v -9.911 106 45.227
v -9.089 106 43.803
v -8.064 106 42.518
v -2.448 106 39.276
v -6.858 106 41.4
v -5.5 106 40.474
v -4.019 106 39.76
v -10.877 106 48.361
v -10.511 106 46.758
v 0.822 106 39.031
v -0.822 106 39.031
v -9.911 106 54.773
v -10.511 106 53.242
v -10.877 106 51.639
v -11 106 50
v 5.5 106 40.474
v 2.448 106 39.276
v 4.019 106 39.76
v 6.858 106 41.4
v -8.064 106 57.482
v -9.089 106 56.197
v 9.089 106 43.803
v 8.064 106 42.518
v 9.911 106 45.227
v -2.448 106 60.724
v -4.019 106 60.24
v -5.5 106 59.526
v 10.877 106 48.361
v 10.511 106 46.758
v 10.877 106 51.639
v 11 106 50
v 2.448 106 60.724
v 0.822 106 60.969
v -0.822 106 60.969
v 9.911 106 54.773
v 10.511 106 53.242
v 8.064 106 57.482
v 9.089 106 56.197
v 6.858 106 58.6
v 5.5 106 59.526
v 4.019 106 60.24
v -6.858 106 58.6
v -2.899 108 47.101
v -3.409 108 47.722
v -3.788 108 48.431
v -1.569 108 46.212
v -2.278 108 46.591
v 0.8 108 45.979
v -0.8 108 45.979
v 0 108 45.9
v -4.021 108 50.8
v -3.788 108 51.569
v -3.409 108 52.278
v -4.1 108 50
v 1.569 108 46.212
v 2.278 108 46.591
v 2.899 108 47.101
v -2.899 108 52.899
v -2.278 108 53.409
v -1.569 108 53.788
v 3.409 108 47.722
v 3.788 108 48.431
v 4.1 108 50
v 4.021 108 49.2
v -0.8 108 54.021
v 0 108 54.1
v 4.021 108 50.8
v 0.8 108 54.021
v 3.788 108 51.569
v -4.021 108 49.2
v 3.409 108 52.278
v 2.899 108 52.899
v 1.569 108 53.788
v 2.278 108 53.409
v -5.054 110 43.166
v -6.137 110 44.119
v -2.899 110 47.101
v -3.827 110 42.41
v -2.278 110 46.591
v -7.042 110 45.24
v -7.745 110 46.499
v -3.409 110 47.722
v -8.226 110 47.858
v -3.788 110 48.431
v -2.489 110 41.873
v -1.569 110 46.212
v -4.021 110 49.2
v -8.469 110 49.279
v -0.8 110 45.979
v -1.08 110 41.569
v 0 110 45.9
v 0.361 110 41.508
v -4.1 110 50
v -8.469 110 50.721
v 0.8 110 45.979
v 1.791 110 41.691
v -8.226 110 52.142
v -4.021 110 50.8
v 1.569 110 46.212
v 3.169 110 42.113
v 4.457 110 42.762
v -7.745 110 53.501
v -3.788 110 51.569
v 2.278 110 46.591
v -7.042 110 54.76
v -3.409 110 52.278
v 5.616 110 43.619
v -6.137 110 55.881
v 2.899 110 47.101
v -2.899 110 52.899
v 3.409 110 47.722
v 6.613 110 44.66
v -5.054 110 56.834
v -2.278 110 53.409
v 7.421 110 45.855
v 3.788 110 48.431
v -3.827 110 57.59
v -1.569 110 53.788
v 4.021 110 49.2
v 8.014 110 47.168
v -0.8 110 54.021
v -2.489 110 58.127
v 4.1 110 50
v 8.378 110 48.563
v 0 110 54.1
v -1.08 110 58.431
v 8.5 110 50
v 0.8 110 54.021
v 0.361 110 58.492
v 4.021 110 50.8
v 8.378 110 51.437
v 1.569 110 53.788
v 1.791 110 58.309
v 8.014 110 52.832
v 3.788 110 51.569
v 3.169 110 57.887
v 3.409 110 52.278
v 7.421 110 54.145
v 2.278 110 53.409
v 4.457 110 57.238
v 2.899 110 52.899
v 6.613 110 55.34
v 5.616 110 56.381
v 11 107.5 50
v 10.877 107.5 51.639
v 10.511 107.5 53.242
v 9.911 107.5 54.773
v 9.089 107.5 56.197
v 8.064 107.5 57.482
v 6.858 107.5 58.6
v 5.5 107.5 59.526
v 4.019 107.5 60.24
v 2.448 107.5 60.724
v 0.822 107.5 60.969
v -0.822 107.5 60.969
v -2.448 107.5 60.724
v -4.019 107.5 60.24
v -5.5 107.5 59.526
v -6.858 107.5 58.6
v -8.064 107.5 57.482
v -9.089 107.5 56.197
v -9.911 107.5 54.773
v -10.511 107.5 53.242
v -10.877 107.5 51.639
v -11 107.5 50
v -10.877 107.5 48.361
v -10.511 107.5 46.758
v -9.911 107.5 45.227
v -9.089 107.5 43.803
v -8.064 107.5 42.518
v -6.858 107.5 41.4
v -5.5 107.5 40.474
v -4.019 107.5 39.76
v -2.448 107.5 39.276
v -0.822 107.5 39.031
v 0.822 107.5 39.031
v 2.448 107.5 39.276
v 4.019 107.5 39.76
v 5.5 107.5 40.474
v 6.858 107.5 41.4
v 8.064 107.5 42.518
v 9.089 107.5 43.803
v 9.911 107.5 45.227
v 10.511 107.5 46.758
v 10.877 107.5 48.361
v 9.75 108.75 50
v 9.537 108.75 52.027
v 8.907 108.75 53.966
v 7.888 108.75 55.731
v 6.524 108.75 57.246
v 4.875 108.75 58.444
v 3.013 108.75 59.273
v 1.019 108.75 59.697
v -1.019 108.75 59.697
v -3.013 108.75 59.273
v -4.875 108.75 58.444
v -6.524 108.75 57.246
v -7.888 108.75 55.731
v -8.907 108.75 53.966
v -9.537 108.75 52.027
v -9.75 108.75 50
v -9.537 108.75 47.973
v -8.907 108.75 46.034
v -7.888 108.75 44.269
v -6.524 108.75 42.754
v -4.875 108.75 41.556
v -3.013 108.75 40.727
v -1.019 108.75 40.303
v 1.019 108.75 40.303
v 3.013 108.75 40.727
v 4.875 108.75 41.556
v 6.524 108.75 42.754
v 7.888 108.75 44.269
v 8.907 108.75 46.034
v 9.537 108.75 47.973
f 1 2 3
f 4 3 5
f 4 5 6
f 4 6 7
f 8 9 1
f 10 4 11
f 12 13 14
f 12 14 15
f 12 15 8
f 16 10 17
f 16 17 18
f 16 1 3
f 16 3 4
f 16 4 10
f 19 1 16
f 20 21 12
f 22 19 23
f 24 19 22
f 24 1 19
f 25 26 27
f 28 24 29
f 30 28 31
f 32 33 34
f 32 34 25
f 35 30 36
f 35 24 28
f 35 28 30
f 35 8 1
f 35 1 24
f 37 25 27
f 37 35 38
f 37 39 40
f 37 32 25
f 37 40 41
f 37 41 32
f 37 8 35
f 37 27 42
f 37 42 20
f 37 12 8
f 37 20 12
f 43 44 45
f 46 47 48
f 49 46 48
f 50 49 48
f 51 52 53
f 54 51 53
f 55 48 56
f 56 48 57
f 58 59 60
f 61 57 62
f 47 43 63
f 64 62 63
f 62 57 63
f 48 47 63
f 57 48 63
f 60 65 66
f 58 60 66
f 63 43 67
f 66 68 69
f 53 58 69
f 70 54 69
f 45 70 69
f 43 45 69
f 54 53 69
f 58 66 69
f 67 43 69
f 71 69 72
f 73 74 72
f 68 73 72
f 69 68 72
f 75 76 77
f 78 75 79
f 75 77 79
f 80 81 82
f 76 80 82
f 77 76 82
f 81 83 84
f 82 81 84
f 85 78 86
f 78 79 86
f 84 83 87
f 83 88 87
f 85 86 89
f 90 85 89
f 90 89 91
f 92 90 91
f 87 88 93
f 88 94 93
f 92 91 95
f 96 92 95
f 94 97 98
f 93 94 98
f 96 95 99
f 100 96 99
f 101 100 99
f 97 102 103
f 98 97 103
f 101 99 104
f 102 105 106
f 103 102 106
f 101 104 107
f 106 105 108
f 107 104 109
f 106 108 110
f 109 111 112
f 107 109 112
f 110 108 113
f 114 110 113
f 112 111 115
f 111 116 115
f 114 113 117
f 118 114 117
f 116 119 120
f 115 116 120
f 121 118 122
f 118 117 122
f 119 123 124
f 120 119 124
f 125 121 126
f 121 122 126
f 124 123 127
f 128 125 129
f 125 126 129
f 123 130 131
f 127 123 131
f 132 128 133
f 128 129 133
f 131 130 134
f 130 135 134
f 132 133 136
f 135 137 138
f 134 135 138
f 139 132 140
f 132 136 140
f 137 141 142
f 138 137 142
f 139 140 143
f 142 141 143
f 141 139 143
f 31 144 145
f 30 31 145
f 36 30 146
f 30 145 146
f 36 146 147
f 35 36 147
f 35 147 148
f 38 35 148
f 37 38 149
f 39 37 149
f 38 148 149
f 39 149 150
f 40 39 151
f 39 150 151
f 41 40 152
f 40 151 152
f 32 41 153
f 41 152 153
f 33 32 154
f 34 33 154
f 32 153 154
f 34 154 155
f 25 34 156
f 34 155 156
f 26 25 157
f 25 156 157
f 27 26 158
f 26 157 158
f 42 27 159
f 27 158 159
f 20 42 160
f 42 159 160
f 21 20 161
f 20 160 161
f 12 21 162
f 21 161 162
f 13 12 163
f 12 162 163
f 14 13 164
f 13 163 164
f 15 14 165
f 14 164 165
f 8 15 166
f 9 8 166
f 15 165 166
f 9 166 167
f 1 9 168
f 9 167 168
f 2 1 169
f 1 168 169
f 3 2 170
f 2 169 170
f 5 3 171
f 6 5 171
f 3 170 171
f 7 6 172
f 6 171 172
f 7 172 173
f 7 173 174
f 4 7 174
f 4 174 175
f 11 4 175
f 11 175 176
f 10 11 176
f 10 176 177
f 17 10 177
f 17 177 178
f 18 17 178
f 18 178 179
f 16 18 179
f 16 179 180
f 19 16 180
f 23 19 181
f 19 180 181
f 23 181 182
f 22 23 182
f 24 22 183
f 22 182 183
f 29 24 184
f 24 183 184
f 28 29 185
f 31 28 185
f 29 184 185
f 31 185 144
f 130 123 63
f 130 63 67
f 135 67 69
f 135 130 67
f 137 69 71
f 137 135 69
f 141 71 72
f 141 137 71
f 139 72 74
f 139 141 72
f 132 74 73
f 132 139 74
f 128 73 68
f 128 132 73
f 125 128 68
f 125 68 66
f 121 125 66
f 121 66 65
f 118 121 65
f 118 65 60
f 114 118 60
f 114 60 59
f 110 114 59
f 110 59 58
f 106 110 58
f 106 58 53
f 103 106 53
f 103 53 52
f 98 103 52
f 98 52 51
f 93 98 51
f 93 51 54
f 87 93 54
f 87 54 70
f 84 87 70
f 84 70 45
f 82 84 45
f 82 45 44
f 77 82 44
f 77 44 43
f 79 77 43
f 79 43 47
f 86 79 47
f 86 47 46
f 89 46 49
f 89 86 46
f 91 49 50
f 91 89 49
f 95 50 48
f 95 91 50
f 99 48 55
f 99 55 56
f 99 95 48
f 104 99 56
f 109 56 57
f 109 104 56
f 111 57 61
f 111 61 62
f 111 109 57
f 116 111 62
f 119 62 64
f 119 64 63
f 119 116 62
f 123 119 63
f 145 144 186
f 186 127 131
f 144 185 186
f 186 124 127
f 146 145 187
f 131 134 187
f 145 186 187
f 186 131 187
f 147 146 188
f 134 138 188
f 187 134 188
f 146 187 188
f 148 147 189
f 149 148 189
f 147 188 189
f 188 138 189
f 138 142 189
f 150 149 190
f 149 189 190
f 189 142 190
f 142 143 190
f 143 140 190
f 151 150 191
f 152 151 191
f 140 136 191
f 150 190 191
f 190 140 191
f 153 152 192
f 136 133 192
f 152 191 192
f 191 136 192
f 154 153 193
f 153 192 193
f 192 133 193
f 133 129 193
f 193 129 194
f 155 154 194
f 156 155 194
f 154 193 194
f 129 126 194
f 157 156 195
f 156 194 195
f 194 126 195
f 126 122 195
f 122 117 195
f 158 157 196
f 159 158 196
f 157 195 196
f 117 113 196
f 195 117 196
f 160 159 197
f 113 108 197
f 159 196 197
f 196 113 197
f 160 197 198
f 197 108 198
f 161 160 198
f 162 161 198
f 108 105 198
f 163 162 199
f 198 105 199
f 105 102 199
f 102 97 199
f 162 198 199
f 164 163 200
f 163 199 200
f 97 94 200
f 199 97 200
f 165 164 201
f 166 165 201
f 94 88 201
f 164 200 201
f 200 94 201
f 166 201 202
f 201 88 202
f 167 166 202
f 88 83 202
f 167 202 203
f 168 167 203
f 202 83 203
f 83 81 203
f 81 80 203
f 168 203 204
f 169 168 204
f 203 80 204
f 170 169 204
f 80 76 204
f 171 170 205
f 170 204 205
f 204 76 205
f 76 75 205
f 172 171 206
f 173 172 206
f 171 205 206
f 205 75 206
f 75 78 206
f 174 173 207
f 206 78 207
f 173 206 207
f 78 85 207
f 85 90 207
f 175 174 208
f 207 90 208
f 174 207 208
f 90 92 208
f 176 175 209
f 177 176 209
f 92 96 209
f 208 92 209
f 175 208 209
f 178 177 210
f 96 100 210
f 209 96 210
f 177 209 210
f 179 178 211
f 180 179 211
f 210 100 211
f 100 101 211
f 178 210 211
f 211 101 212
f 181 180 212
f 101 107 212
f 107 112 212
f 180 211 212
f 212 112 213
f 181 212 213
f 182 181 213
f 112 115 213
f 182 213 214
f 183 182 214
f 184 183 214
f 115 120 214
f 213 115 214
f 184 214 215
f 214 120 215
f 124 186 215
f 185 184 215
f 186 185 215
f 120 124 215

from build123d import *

# Parameters (mm, degrees)
BOX256_W          = 40
BOX256_H          = 20
BOX256_DEPTH      = 40
CYLINDER656_R     = 4.1
CYLINDER656_DEPTH = 10
CYLINDER657_R     = 11
CYLINDER657_DEPTH = 4
CHAMFER061_SIZE   = 2.5


with BuildPart() as krychle256:
    # Box256 → Box256 (new body)
    with BuildSketch(Plane(origin=(-20, 110, 30), x_dir=(1, 0, 0), z_dir=(0, 0, 1))):
        with Locations((20, 10)):
            Rectangle(BOX256_W, BOX256_H)
    extrude(amount=BOX256_DEPTH)


with BuildPart() as v_lec656:
    # Cylinder656 → Cylinder656 (new body)
    with BuildSketch(Plane(origin=(0, 118, 50), x_dir=(1, 0, 0), z_dir=(0, -1, 0))):
        Circle(CYLINDER656_R)
    extrude(amount=CYLINDER656_DEPTH)


with BuildPart() as chamfer061:
    # Cylinder657 → Cylinder657 (new body)
    with BuildSketch(Plane(origin=(0, 110, 50), x_dir=(1, 0, 0), z_dir=(0, -1, 0))):
        Circle(CYLINDER657_R)
    extrude(amount=CYLINDER657_DEPTH)

    # Cut265: cut Válec656
    add(v_lec656.part, mode=Mode.SUBTRACT)

    # Cut552: cut Krychle256
    add(krychle256.part, mode=Mode.SUBTRACT)

    # Chamfer061
    chamfer061_edges = [chamfer061.edges().sort_by_distance(p)[0] for p in [
        (-11, 110, 50),
    ]]
    chamfer(chamfer061_edges, length=CHAMFER061_SIZE)


solid = chamfer061.part
